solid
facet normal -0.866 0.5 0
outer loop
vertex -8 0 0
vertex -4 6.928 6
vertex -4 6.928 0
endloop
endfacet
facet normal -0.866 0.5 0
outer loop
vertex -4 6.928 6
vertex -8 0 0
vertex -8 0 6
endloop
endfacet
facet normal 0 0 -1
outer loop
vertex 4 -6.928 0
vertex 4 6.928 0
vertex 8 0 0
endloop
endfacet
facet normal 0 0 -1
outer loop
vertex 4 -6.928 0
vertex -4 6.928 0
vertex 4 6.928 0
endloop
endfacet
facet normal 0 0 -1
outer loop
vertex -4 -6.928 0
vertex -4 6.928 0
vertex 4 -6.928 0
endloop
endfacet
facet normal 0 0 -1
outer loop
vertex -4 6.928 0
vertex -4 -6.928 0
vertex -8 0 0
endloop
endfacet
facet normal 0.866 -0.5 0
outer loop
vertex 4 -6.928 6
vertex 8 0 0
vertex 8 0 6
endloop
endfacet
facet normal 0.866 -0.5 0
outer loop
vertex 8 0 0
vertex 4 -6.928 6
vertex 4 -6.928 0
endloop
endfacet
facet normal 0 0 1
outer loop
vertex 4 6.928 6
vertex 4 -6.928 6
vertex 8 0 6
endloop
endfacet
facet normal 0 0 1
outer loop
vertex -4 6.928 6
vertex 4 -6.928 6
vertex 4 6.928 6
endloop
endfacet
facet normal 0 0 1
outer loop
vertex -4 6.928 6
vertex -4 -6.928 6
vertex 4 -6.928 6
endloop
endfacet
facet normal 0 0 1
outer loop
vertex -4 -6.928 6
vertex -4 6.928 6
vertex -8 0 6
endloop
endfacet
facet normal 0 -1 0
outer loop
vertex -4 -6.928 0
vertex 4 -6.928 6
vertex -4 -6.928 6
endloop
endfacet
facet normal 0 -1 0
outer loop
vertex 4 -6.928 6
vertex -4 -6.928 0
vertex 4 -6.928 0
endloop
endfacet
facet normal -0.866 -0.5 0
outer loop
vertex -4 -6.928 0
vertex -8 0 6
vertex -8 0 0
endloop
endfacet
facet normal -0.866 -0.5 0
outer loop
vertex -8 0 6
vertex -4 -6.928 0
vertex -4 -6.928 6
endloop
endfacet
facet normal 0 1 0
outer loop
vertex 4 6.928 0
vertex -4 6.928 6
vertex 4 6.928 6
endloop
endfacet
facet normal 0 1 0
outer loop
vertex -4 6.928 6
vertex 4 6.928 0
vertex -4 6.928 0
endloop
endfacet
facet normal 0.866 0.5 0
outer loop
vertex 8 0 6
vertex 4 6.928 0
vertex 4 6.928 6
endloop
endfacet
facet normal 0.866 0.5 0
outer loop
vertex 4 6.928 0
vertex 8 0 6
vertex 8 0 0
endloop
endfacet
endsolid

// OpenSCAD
$fn = 50;

difference() {
	union() {
		linear_extrude(height = 6) {
			polygon(points = [[8.0, 0.0], [4.000000000000001, 6.928203230275509], [-3.9999999999999982, 6.92820323027551], [-8.0, 9.797174393178826e-16], [-4.0000000000000036, -6.928203230275508], [3.9999999999999947, -6.928203230275512]]);
		}
	}
	union();
}
